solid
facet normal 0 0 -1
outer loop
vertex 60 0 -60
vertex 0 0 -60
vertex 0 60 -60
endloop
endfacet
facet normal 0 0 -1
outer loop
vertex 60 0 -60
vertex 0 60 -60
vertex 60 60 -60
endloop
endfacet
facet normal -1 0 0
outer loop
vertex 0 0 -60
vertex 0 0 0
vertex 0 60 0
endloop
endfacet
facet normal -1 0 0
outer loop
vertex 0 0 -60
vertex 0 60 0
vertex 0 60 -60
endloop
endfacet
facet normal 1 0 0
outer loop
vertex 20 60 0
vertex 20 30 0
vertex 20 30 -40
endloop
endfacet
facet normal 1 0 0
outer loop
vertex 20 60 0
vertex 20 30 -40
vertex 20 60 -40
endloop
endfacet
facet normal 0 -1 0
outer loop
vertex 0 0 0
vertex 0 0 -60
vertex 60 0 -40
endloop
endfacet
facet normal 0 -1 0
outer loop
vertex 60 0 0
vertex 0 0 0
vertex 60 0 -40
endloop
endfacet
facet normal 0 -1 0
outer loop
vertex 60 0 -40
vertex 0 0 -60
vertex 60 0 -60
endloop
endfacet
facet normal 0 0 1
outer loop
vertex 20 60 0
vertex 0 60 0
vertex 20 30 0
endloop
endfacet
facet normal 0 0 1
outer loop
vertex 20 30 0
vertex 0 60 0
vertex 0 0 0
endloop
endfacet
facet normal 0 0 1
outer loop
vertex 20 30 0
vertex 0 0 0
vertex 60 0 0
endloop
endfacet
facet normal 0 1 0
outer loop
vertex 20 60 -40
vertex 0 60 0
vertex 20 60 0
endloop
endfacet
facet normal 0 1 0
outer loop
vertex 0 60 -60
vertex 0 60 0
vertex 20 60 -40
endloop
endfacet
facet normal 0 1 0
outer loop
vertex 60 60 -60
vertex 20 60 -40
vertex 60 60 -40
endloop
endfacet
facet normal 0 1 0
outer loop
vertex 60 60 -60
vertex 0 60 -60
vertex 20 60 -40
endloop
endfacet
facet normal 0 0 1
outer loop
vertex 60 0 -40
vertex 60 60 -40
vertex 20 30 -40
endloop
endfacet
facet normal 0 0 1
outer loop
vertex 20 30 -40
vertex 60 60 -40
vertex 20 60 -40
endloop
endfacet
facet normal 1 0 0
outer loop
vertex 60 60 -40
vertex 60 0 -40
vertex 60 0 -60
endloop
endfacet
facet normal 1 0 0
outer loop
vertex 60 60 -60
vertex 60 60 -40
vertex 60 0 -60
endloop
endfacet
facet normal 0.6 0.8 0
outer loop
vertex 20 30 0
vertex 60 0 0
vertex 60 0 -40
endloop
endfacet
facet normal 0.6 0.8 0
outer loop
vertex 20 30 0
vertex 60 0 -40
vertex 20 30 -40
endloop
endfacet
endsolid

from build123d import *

# Parameters (mm, degrees)
CROQUIS2_W              = 60
CROQUIS2_H              = 60
SALIENTE_EXTRUIR1_DEPTH = 60
CORTAR_EXTRUIR1_DEPTH   = 40


with BuildPart() as part:
    # Croquis2 → Saliente-Extruir1 (new body)
    with BuildSketch(Plane(origin=(0, 0, 0), x_dir=(1, 0, 0), z_dir=(0, 1, 0))):
        with Locations((30, 30)):
            Rectangle(CROQUIS2_W, CROQUIS2_H)
    extrude(amount=SALIENTE_EXTRUIR1_DEPTH)

    # Croquis3 → Cortar-Extruir1 (cut)
    with BuildSketch(Plane.XY):
        Polygon((60, 0), (20, 30), (20, 60), (60, 60), align=None)
    extrude(amount=-CORTAR_EXTRUIR1_DEPTH, mode=Mode.SUBTRACT)


solid = part.part
